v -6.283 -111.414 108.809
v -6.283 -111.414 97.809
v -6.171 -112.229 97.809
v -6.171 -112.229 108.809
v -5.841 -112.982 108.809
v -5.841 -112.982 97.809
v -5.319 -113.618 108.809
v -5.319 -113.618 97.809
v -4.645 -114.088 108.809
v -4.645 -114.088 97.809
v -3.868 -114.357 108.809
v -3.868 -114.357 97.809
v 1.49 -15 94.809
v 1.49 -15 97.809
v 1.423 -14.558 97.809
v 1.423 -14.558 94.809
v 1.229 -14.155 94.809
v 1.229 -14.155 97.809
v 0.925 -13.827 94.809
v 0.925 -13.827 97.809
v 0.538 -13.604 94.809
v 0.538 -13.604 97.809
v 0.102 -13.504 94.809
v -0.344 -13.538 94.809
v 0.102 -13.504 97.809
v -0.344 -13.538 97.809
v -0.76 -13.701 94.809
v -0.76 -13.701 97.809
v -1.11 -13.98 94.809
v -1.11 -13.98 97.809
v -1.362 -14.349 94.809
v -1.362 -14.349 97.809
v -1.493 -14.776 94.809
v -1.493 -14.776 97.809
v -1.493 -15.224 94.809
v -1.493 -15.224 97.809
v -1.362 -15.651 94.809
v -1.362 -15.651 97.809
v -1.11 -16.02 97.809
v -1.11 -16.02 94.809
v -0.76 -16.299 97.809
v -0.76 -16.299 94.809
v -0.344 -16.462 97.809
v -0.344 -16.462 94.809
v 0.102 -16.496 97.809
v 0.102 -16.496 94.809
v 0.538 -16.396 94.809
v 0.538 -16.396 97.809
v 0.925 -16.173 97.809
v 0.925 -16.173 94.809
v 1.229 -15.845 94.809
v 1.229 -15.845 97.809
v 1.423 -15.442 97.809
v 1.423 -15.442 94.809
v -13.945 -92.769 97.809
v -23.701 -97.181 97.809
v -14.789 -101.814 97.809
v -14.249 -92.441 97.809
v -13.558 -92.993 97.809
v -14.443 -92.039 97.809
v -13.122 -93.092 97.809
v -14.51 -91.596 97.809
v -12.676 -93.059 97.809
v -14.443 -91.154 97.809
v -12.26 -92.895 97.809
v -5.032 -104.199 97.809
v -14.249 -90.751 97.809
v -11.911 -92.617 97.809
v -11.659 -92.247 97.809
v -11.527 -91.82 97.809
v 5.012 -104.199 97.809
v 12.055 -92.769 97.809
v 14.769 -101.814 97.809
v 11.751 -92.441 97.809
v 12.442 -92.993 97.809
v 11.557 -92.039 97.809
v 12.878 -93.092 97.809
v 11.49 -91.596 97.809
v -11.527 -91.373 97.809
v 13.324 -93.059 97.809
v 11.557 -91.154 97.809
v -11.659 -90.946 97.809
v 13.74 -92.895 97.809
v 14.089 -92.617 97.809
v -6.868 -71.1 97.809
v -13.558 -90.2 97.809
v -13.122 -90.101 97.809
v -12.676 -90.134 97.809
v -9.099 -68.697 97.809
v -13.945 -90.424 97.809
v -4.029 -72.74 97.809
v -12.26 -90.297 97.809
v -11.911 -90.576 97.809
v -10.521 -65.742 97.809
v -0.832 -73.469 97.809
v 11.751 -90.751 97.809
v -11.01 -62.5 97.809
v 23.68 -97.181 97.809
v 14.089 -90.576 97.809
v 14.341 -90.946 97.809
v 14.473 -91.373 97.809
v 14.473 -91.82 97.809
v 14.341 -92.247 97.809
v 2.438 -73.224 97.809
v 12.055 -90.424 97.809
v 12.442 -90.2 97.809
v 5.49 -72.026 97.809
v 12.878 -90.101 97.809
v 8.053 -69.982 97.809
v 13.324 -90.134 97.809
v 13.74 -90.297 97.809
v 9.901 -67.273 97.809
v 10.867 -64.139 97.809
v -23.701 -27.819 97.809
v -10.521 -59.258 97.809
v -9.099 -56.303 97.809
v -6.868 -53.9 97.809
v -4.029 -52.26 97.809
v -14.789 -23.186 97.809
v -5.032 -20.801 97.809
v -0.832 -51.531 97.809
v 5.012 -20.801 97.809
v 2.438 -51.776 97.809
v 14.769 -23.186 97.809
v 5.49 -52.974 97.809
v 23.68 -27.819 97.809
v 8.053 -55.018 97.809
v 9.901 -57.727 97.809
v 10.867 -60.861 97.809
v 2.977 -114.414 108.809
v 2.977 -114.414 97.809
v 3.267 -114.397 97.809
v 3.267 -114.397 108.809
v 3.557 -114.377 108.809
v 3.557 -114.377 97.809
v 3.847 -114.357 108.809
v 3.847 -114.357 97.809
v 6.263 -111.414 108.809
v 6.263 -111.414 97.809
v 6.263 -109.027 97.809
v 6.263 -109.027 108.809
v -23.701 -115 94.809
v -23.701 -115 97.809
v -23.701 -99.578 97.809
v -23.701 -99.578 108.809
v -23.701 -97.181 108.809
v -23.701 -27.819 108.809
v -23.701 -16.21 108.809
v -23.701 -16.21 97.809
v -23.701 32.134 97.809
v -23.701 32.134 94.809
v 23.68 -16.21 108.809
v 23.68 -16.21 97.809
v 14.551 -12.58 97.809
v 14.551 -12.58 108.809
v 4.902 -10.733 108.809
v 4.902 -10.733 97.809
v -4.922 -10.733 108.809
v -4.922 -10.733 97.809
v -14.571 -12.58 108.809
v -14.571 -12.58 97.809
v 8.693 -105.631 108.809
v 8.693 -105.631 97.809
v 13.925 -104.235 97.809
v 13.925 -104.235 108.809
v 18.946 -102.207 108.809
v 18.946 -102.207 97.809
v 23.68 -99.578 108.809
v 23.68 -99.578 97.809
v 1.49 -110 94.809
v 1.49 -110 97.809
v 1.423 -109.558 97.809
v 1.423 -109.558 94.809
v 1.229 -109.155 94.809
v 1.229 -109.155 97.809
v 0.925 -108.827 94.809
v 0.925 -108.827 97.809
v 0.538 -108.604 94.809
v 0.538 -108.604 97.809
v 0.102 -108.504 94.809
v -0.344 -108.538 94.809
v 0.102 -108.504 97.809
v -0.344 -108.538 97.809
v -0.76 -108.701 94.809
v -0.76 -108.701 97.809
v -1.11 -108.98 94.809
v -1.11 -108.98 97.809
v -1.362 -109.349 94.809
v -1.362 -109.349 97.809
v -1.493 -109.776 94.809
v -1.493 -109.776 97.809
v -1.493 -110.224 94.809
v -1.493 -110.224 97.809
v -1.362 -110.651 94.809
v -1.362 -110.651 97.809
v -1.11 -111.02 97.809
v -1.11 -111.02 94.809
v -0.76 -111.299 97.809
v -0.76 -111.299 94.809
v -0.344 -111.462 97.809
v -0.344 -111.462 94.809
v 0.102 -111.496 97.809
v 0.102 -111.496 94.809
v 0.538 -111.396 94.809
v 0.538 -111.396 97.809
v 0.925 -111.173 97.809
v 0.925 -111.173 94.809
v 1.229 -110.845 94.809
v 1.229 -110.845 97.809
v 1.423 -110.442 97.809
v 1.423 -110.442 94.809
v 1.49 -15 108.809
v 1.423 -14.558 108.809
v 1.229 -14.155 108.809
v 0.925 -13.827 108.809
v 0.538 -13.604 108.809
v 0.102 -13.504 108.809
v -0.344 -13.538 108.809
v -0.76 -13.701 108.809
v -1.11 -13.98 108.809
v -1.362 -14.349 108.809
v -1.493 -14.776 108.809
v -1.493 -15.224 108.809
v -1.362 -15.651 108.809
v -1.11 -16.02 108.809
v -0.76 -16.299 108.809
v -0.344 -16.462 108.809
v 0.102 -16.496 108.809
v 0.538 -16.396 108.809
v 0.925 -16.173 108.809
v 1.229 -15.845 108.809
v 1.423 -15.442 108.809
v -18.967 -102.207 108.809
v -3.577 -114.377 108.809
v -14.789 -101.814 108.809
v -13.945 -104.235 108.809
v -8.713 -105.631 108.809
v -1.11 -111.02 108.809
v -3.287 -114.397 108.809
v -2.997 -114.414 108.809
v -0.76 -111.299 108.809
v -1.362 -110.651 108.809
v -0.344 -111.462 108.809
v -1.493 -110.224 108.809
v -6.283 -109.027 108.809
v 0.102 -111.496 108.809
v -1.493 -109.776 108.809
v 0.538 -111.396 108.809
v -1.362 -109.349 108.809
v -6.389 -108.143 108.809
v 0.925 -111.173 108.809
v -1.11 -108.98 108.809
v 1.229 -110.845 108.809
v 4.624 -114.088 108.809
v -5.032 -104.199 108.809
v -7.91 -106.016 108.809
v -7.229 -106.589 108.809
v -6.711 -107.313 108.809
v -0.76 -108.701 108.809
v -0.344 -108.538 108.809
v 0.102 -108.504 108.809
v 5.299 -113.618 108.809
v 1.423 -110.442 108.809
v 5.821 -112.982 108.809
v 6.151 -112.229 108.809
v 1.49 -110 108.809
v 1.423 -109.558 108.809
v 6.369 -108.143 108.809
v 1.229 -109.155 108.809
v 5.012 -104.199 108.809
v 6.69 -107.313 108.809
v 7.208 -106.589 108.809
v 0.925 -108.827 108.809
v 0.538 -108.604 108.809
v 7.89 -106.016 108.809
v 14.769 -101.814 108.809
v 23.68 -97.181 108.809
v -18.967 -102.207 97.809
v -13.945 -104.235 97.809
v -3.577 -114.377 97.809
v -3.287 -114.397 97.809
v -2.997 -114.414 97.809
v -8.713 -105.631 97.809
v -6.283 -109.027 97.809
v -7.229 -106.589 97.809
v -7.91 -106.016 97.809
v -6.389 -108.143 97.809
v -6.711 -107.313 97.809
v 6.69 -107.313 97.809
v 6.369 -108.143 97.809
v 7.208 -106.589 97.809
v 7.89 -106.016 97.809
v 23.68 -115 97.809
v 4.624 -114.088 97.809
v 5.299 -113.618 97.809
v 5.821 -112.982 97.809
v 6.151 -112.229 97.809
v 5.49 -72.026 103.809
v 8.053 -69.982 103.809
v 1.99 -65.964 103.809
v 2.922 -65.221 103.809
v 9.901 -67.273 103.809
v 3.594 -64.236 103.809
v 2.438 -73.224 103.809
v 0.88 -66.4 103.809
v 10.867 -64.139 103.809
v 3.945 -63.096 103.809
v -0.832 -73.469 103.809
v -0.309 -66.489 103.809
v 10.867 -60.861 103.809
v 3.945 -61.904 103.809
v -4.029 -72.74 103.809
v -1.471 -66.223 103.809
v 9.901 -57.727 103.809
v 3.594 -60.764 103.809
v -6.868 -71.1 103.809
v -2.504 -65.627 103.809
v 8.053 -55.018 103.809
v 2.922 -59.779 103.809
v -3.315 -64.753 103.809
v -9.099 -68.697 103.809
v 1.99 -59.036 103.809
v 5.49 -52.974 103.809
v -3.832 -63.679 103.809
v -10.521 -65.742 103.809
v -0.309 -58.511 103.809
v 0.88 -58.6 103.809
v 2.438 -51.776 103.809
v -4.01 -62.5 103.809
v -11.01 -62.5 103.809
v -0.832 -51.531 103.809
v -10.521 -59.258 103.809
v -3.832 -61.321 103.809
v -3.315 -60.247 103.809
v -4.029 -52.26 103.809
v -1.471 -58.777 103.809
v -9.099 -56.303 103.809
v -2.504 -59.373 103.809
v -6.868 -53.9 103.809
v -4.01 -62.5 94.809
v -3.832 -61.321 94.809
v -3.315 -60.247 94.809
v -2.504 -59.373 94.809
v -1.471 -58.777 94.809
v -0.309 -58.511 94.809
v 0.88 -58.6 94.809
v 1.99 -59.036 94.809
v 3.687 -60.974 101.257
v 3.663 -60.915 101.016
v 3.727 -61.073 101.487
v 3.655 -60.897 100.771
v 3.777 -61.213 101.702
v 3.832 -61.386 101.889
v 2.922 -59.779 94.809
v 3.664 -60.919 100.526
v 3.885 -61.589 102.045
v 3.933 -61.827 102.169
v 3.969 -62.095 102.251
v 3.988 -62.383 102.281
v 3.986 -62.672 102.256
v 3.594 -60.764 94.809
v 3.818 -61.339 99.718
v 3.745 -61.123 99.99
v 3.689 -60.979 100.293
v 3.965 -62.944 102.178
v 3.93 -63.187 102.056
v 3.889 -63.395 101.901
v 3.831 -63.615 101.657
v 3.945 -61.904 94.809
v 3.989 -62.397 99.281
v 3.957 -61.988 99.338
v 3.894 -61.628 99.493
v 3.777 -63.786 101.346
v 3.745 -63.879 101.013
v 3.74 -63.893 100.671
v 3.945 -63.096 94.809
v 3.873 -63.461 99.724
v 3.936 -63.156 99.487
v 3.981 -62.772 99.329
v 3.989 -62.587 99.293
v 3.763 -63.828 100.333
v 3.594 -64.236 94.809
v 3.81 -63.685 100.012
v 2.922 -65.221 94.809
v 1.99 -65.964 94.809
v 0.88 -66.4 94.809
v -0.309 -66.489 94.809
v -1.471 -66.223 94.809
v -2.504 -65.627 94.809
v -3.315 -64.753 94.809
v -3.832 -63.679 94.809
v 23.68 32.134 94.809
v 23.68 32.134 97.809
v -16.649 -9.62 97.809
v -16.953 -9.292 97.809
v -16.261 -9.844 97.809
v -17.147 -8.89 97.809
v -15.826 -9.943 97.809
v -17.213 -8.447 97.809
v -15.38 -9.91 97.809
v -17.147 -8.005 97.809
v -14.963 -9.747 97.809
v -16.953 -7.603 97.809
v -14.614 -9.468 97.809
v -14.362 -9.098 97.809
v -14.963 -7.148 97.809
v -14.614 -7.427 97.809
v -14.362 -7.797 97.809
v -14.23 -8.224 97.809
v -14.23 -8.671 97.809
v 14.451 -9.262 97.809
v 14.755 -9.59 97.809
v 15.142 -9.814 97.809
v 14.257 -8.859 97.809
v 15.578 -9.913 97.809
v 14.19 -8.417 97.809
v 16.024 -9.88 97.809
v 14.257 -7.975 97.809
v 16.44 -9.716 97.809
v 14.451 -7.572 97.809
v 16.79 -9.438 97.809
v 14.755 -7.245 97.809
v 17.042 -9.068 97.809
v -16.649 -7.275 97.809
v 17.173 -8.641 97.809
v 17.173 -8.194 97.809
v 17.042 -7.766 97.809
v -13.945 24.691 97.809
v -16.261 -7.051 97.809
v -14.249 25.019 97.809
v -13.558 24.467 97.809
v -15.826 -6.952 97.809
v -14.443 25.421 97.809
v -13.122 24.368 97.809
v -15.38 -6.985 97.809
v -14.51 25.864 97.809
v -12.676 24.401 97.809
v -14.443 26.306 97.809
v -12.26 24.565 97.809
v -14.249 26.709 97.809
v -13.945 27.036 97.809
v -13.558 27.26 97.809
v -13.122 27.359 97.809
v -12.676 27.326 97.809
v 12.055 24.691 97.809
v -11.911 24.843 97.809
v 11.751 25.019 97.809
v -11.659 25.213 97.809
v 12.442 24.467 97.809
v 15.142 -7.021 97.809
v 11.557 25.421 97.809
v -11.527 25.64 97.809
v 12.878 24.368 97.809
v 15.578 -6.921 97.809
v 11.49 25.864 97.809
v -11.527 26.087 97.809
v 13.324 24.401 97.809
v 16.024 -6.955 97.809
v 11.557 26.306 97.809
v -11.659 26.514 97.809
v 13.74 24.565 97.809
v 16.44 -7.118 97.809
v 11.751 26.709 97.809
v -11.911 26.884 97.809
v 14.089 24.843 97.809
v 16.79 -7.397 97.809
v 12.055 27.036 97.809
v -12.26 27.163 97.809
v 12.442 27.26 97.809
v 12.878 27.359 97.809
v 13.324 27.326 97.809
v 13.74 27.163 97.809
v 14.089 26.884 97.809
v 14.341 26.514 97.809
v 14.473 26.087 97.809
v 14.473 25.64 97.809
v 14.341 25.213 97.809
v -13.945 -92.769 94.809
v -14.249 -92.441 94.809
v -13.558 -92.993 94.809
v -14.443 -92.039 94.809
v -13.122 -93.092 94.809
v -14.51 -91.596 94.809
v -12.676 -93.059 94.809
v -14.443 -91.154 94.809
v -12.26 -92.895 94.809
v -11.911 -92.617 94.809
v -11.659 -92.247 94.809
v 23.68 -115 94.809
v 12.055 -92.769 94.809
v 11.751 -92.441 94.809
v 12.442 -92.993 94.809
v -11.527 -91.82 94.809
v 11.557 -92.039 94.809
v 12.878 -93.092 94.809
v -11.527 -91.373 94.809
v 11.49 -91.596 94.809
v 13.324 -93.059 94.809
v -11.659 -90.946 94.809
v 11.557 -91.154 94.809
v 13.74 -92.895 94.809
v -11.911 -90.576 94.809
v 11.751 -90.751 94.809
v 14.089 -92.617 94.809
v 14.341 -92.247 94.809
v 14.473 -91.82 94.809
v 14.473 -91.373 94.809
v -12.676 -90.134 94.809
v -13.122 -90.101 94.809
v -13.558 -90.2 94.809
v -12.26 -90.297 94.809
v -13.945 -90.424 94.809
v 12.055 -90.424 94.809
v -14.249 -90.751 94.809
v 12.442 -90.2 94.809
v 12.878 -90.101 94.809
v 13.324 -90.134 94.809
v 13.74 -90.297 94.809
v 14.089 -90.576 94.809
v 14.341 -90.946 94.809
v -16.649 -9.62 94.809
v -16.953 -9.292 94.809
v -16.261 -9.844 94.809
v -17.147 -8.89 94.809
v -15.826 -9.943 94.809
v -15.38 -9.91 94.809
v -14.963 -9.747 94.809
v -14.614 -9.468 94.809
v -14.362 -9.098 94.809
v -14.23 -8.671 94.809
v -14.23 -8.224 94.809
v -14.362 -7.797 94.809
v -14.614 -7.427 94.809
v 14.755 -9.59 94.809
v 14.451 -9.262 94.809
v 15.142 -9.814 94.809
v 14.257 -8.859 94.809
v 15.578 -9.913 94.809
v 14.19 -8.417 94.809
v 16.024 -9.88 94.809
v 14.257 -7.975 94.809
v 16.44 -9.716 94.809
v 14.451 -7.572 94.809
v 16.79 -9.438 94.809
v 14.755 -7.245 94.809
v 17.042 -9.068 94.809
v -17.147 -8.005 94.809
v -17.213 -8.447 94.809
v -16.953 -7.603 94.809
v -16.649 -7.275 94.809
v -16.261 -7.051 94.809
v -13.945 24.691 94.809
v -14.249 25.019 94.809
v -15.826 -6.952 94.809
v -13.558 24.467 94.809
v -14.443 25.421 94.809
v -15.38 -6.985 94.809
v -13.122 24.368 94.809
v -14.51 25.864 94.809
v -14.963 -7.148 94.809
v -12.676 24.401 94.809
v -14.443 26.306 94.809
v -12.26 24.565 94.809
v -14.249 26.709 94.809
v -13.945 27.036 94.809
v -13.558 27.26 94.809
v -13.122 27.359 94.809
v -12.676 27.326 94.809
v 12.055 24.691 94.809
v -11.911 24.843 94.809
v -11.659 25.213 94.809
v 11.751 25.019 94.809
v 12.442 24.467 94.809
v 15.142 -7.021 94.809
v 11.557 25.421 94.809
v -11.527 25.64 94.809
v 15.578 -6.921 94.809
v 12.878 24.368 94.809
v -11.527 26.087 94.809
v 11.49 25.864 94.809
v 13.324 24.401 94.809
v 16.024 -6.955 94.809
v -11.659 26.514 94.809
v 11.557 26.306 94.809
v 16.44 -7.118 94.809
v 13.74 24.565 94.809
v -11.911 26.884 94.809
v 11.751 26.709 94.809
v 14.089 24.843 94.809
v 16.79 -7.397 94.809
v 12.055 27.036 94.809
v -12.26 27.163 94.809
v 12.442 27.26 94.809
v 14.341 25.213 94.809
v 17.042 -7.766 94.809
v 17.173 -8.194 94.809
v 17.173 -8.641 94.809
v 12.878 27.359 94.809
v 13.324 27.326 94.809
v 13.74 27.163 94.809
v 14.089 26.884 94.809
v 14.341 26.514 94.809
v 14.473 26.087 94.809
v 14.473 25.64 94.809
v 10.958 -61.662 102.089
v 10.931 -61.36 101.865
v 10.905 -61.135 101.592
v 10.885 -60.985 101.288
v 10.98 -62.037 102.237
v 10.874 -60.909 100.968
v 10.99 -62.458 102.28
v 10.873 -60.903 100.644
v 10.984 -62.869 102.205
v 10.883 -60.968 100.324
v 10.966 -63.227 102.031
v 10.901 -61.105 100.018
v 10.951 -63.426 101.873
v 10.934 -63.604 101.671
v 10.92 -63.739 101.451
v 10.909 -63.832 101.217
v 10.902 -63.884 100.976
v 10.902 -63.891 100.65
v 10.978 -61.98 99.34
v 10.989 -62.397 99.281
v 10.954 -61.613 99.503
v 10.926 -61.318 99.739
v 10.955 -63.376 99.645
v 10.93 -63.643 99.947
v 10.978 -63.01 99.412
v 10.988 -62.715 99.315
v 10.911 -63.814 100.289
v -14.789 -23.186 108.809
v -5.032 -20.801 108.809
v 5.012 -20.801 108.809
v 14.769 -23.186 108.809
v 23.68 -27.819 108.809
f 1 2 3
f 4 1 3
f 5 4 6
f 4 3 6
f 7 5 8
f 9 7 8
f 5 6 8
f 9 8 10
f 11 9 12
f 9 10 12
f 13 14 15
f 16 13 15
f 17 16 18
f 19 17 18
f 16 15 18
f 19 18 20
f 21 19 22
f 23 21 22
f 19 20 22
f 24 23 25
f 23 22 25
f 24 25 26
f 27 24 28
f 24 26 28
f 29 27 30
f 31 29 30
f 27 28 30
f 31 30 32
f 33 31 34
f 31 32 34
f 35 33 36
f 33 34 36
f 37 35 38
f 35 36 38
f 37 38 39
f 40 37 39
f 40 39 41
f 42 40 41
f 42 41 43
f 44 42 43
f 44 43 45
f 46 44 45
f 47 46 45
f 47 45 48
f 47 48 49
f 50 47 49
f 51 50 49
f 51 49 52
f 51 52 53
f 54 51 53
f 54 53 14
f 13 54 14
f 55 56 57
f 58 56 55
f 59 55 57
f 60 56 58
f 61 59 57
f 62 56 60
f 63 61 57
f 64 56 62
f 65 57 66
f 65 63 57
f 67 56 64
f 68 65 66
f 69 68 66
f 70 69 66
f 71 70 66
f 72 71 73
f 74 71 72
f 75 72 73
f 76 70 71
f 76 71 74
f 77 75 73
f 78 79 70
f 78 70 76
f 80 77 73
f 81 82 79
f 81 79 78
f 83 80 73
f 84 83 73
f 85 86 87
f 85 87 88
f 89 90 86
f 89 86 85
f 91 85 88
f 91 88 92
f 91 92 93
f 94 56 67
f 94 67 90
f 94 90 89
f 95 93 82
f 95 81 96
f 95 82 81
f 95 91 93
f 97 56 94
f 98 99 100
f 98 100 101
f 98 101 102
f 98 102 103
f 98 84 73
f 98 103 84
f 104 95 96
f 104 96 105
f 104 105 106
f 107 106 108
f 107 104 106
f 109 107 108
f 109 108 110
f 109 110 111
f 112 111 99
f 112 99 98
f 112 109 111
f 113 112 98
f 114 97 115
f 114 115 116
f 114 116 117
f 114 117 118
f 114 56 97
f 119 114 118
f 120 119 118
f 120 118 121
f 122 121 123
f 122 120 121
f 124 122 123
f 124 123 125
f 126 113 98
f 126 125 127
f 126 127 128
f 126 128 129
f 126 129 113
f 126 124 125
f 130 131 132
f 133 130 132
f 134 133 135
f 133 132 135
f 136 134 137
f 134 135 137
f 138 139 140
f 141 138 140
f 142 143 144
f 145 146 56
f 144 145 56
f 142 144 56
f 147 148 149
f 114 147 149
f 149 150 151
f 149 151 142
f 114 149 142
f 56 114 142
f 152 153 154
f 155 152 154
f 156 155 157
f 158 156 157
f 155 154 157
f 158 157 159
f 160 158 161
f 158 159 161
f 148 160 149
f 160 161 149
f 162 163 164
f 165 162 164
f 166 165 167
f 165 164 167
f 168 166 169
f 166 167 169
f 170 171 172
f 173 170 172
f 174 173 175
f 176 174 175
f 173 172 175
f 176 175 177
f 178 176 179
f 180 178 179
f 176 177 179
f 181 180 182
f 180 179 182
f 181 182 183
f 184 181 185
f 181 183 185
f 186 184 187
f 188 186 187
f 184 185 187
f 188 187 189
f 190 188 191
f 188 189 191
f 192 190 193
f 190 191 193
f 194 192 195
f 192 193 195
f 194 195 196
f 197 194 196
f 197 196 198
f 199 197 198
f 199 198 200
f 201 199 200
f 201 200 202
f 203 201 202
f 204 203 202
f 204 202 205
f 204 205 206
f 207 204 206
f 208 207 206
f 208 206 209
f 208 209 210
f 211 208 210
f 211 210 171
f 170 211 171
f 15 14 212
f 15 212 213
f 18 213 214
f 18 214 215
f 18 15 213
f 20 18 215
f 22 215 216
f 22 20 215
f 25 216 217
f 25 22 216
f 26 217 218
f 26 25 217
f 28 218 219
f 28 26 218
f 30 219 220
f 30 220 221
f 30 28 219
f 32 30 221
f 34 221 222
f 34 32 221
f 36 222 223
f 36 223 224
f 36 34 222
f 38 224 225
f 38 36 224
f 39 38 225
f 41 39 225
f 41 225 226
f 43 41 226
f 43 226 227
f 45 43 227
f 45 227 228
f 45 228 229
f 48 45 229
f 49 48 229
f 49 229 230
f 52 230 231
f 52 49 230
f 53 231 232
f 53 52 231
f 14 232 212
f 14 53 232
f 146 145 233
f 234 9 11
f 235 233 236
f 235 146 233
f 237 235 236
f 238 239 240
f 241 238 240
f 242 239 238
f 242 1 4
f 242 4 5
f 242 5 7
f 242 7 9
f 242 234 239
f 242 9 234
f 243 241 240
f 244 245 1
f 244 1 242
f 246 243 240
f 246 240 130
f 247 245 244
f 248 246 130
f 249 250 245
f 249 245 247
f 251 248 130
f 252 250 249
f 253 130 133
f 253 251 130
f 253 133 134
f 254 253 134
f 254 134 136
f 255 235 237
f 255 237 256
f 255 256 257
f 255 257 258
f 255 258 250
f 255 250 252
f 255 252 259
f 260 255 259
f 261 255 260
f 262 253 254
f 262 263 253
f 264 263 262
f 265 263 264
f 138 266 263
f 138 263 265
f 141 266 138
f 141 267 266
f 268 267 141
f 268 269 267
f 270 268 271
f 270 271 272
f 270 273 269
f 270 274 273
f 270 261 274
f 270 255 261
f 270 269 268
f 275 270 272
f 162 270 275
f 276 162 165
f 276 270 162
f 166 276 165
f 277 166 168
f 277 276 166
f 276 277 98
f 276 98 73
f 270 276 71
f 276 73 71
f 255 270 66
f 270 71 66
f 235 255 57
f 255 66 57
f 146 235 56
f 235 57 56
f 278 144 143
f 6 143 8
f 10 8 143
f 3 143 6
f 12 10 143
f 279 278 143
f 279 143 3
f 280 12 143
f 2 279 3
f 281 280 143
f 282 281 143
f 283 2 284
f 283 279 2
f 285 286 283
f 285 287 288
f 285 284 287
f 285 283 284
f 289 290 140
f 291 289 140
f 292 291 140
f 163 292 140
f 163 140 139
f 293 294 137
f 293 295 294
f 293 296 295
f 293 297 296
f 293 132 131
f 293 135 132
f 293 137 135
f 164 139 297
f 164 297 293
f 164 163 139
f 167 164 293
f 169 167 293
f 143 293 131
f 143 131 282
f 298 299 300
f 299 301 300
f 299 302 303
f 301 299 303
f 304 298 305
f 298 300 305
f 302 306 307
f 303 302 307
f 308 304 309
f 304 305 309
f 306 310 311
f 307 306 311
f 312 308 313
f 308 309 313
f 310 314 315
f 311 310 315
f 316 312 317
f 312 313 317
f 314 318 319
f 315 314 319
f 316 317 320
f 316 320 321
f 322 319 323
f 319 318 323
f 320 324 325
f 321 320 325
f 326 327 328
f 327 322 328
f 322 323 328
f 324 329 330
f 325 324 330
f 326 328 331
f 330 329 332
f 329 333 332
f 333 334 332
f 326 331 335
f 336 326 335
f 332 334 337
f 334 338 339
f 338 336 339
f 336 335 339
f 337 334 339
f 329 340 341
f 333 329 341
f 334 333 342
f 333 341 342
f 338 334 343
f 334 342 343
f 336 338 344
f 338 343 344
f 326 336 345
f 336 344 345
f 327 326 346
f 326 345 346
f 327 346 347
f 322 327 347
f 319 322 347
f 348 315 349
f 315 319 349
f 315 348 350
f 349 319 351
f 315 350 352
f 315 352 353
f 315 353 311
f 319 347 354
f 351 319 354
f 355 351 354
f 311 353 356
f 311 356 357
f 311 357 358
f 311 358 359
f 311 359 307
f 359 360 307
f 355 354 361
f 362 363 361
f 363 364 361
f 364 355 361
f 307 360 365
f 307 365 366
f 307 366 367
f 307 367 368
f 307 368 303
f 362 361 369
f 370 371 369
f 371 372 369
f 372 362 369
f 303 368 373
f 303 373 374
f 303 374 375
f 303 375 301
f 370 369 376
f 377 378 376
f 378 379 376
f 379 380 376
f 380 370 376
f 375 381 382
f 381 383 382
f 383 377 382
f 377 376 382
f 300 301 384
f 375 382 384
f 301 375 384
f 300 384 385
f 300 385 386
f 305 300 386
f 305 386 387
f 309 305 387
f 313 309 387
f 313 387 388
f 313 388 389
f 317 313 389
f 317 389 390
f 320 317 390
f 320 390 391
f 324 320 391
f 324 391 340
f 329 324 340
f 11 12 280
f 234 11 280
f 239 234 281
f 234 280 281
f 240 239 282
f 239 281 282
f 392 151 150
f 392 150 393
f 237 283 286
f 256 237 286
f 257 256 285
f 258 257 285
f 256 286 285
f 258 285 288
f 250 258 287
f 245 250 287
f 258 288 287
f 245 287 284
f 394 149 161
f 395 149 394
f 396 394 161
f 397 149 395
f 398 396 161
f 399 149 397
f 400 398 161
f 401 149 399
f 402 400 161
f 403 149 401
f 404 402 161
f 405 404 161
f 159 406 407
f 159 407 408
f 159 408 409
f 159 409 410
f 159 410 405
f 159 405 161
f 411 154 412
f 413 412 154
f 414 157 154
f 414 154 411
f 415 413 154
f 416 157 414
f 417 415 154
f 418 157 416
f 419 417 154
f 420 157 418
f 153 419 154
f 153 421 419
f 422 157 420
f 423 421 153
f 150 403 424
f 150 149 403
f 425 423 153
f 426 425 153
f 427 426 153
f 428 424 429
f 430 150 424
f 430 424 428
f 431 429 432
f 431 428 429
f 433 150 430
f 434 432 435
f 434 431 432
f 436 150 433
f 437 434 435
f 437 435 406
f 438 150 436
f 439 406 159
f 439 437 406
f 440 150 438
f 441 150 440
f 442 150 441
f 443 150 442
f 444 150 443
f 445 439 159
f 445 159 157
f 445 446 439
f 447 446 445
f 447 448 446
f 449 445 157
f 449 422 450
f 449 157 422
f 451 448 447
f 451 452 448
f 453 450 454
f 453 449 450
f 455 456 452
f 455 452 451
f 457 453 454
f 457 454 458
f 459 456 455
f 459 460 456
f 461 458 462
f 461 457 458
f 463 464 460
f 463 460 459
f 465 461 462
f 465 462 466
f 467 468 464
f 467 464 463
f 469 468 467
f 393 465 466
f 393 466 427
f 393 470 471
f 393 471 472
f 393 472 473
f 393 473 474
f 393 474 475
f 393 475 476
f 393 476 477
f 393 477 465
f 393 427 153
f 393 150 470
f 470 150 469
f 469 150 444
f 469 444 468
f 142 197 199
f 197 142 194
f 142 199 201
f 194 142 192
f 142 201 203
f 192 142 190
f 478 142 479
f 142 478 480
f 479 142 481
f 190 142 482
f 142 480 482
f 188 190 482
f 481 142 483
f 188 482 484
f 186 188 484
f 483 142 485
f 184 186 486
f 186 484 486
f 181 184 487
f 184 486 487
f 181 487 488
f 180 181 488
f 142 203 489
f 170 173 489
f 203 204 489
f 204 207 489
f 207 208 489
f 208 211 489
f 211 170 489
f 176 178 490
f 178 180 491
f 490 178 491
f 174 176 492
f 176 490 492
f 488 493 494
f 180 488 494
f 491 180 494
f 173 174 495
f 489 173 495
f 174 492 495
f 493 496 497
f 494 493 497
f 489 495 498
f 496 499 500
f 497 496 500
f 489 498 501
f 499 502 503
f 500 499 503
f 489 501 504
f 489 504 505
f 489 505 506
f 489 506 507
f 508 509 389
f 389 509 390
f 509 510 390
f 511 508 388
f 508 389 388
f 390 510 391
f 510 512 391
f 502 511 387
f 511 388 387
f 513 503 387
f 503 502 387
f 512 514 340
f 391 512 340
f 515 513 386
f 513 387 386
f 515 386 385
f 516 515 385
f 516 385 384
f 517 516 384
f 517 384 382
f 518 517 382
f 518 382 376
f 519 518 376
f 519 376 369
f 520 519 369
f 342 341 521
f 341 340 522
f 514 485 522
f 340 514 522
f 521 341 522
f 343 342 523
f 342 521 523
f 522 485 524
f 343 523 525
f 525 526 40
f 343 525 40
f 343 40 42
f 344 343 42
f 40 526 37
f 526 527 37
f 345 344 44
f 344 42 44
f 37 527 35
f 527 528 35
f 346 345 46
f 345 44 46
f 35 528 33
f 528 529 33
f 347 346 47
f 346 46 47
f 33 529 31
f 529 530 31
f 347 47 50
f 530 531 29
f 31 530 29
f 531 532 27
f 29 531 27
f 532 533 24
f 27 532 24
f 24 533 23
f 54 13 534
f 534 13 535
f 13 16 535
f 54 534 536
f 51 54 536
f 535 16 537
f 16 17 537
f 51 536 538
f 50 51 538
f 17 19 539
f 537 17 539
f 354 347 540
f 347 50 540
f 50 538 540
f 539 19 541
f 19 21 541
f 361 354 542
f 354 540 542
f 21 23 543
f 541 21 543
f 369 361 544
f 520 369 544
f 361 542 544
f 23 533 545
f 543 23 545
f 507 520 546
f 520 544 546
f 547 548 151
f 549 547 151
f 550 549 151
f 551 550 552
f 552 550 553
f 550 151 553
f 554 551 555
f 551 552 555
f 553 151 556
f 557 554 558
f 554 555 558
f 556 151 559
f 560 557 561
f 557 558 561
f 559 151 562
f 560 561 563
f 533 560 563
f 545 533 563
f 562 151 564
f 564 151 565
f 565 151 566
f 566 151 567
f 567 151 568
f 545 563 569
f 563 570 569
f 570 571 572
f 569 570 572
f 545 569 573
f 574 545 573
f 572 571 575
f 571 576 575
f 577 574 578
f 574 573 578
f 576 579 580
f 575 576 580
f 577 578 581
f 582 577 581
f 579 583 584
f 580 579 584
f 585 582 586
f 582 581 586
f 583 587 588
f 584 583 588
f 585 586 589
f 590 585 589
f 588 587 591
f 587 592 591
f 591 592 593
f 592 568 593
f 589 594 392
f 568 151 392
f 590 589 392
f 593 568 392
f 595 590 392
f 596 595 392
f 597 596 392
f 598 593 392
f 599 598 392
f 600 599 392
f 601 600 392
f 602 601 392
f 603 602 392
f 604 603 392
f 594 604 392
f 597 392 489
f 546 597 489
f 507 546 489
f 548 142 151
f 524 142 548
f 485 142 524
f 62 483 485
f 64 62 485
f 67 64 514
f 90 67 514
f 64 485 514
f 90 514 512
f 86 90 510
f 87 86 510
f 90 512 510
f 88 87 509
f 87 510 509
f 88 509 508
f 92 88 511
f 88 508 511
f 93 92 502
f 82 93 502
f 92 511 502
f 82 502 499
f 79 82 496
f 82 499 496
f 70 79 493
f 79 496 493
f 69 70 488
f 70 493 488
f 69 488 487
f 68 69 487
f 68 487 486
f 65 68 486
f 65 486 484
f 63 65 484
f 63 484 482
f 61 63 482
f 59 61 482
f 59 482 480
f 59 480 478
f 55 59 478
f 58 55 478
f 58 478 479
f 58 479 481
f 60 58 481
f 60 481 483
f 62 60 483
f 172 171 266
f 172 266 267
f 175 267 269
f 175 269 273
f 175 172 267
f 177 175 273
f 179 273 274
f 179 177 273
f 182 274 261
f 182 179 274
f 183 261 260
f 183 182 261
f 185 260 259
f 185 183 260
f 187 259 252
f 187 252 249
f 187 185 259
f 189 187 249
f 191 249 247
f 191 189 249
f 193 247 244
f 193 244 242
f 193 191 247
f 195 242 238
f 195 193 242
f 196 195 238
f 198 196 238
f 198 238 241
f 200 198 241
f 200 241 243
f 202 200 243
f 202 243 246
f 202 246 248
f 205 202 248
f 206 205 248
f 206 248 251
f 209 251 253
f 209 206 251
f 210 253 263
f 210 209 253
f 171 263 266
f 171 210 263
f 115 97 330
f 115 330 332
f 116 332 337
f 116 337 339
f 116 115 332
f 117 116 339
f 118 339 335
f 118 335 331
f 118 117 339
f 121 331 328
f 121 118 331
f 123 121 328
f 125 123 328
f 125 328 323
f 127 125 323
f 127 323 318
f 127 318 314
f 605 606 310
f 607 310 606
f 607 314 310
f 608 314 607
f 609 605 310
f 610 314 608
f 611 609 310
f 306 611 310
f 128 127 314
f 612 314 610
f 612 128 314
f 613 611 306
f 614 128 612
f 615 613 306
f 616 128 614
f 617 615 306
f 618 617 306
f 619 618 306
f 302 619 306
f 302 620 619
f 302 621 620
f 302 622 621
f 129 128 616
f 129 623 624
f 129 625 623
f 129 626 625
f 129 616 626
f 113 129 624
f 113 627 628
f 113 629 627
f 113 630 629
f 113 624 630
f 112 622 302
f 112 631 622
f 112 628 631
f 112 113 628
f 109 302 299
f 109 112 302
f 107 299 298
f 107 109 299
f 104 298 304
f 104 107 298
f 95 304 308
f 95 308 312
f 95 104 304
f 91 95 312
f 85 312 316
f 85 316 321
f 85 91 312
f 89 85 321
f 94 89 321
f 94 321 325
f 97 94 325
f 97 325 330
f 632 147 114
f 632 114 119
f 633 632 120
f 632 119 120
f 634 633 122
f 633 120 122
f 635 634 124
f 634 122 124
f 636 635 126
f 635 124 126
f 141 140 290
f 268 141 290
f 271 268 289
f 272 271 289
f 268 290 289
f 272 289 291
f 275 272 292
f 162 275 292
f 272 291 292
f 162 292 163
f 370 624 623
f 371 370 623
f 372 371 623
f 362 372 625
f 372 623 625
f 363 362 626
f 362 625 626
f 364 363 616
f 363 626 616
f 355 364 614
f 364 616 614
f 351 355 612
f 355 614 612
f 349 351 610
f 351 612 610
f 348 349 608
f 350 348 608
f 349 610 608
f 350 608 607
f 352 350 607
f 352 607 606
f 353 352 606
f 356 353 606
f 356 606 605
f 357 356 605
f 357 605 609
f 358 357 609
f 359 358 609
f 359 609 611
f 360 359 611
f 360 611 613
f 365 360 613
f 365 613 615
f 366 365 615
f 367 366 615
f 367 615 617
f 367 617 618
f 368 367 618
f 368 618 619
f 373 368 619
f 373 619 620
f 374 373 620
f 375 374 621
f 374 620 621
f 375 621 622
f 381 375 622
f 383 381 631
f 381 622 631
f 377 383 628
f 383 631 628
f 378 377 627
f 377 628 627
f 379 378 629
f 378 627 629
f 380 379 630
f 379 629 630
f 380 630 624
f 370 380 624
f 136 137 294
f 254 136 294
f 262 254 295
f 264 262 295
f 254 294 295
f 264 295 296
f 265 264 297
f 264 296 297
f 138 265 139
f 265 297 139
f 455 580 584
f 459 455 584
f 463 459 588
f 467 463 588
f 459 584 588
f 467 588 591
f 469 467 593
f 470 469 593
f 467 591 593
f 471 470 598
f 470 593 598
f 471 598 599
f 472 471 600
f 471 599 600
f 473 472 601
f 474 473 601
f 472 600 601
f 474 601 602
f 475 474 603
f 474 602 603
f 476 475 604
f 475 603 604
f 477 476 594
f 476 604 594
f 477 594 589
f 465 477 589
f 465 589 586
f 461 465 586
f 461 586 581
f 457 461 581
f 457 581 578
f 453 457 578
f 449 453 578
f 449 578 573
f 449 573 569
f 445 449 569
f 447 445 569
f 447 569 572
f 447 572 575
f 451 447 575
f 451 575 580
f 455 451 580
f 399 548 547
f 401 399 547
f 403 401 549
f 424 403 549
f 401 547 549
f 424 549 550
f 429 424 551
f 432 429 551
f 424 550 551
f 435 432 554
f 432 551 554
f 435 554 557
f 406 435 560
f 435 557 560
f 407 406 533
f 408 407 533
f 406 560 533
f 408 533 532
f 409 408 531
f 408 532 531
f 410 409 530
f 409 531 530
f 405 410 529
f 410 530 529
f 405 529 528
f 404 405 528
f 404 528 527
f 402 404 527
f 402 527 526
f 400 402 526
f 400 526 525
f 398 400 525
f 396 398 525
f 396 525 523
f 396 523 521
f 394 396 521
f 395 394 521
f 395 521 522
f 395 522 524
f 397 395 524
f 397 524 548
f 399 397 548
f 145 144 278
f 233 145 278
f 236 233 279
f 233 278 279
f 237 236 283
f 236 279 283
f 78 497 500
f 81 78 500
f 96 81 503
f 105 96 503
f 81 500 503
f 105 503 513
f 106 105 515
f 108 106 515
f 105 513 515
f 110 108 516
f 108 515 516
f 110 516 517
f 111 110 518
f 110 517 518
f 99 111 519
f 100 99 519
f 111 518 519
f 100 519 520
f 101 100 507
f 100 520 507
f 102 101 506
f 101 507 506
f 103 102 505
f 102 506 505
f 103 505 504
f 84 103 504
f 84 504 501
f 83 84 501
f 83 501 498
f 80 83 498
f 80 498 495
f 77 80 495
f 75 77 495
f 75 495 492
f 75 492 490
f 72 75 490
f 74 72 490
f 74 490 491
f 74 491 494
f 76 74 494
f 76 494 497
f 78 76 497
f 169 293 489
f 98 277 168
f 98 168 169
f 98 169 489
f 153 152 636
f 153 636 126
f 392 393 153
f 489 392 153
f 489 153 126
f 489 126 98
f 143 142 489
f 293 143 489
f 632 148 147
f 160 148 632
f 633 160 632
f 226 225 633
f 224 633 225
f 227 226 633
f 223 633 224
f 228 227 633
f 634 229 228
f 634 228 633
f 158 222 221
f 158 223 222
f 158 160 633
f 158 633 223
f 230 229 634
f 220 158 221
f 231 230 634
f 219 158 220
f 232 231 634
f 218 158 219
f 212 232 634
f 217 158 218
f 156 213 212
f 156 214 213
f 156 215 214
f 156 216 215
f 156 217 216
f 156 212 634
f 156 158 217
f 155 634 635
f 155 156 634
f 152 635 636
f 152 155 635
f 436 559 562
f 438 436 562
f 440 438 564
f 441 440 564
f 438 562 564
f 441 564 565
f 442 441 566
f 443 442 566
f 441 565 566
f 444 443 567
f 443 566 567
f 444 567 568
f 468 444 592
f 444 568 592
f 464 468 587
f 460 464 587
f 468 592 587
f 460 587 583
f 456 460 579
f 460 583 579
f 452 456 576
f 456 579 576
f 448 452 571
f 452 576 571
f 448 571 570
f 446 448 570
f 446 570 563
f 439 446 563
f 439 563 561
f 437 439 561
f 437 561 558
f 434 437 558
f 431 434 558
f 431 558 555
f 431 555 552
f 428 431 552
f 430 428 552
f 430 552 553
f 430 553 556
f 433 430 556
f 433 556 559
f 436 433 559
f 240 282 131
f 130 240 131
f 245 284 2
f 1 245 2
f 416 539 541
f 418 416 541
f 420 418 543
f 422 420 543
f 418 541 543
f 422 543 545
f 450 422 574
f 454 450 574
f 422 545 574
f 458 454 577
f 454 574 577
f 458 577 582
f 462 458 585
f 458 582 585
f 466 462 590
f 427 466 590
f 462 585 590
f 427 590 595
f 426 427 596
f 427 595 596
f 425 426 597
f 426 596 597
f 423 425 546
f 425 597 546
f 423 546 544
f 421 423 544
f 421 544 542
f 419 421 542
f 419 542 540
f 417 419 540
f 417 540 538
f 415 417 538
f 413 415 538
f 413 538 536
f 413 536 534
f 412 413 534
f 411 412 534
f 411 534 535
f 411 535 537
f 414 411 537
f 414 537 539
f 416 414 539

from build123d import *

# Parameters (mm, degrees)
BOSS_EXTRUDE2_DEPTH      = 32.13354
BOSS_EXTRUDE2_DEPTH_BACK = 115
SKETCH1_W                = 47.380920583
SKETCH1_H                = 3
SKETCH3_R                = 1.5
SKETCH3_R_2              = 4
CUT_EXTRUDE1_DEPTH       = 10
SKETCH4_R                = 1.5
BOSS_EXTRUDE6_DEPTH      = 11
CUT_EXTRUDE2_START       = -10
SKETCH4_3_R              = 1.5
CUT_EXTRUDE2_DEPTH       = 10
SKETCH3_5_R              = 11
SKETCH3_5_R_2            = 4
BOSS_EXTRUDE7_DEPTH      = 9
SKETCH8_R                = 1.5
CUT_EXTRUDE3_DEPTH       = 9


with BuildPart() as part:
    # Sketch1 → Boss-Extrude2 (new, two sides: drawn at the far end of the back side and taken through both)
    with BuildSketch(Plane(origin=(0, 0, 0), x_dir=(1, 0, 0), z_dir=(0, 1, 0)).offset(-BOSS_EXTRUDE2_DEPTH_BACK)):
        with Locations((-0.010103172, -96.309011723)):
            Rectangle(SKETCH1_W, SKETCH1_H)
    extrude(amount=BOSS_EXTRUDE2_DEPTH + BOSS_EXTRUDE2_DEPTH_BACK)

    # Sketch3 → Cut-Extrude1 (cut)
    with BuildSketch(Plane(origin=(0, 0, 94.809011723), x_dir=(-1, 0, 0), z_dir=(0, 0, -1))):
        with Locations((-12.989896828, -91.59646)):
            Circle(SKETCH3_R)
        with Locations((0.010103172, -62.5)):
            Circle(SKETCH3_R_2)
        with Locations((13.010103172, -91.59646)):
            Circle(SKETCH3_R)
        with Locations((-15.690228452, -8.417274823)):
            Circle(SKETCH3_R)
        with Locations((15.713451538, -8.447491658)):
            Circle(SKETCH3_R)
        with Locations((13.010103172, 25.86354)):
            Circle(SKETCH3_R)
        with Locations((-12.989896828, 25.86354)):
            Circle(SKETCH3_R)
    extrude(amount=-CUT_EXTRUDE1_DEPTH, mode=Mode.SUBTRACT)

    # Sketch4 → Boss-Extrude6 (add)
    # profile 1 of 2: a face of its own
    with BuildSketch(Plane.XY.offset(97.809011723)):
        with BuildLine():
            ThreePointArc((8.69292522, -105.630700166), (16.466971046, -103.298358119), (23.68035712, -99.577784335))
            Line((23.68035712, -99.577784335), (23.68035712, -97.180860589))
            ThreePointArc((23.68035712, -97.180860589), (-0.010103172, -104.5), (-23.700563463, -97.180860589))
            Line((-23.700563463, -97.180860589), (-23.700563463, -99.577784335))
            ThreePointArc((-23.700563463, -99.577784335), (-16.487177389, -103.298358119), (-8.713131563, -105.630700166))
            ThreePointArc((-8.713131563, -105.630700166), (-6.946765802, -106.93432478), (-6.283436573, -109.027045372))
            Line((-6.283436573, -109.027045372), (-6.283436573, -111.414142146))
            ThreePointArc((-6.283436573, -111.414142146), (-5.602096929, -113.317773977), (-3.867560473, -114.35672592))
            ThreePointArc((-3.867560473, -114.35672592), (-3.432425137, -114.387259634), (-2.997048979, -114.414142146))
            Line((-2.997048979, -114.414142146), (2.976842636, -114.414142146))
            ThreePointArc((2.976842636, -114.414142146), (3.412218794, -114.387259634), (3.84735413, -114.35672592))
            ThreePointArc((3.84735413, -114.35672592), (5.581890586, -113.317773977), (6.263230229, -111.414142146))
            Line((6.263230229, -111.414142146), (6.263230229, -109.027045372))
            ThreePointArc((6.263230229, -109.027045372), (6.926559458, -106.93432478), (8.69292522, -105.630700166))
        make_face()
        with Locations((-0.010103172, -110)):
            Circle(SKETCH4_R, mode=Mode.SUBTRACT)
    # profile 2 of 2: a face of its own
    with BuildSketch(Plane.XY.offset(97.809011723)):
        with BuildLine():
            ThreePointArc((-23.700563463, -27.819139411), (-0.010103172, -20.5), (23.68035712, -27.819139411))
            Line((23.68035712, -27.819139411), (23.68035712, -16.210021698))
            ThreePointArc((23.68035712, -16.210021698), (-0.010103172, -10.5), (-23.700563463, -16.210021698))
            Line((-23.700563463, -16.210021698), (-23.700563463, -27.819139411))
        make_face()
        with Locations((-0.010103172, -15)):
            Circle(SKETCH4_R, mode=Mode.SUBTRACT)
    extrude(amount=BOSS_EXTRUDE6_DEPTH)

    # Sketch4<3> → Cut-Extrude2 (cut)
    with BuildSketch(Plane.XY.offset(97.809011723).offset(CUT_EXTRUDE2_START)):
        with Locations((-0.010103172, -110)):
            Circle(SKETCH4_3_R)
        with Locations((-0.010103172, -15)):
            Circle(SKETCH4_3_R)
    extrude(amount=CUT_EXTRUDE2_DEPTH, mode=Mode.SUBTRACT)

    # Sketch3<5> → Boss-Extrude7 (add)
    with BuildSketch(Plane(origin=(0, 0, 94.809011723), x_dir=(-1, 0, 0), z_dir=(0, 0, -1))):
        with Locations((0.010103172, -62.5)):
            Circle(SKETCH3_5_R)
        with Locations((0.010103172, -62.5)):
            Circle(SKETCH3_5_R_2, mode=Mode.SUBTRACT)
    extrude(amount=-BOSS_EXTRUDE7_DEPTH)

    # Sketch8 → Cut-Extrude3 (cut)
    with BuildSketch(Plane(origin=(10.989896828, 0, 0), x_dir=(0, 0, -1), z_dir=(1, 0, 0))):
        with Locations((-100.78123084, -62.396797047)):
            Circle(SKETCH8_R)
    extrude(amount=-CUT_EXTRUDE3_DEPTH, mode=Mode.SUBTRACT)


solid = part.part
